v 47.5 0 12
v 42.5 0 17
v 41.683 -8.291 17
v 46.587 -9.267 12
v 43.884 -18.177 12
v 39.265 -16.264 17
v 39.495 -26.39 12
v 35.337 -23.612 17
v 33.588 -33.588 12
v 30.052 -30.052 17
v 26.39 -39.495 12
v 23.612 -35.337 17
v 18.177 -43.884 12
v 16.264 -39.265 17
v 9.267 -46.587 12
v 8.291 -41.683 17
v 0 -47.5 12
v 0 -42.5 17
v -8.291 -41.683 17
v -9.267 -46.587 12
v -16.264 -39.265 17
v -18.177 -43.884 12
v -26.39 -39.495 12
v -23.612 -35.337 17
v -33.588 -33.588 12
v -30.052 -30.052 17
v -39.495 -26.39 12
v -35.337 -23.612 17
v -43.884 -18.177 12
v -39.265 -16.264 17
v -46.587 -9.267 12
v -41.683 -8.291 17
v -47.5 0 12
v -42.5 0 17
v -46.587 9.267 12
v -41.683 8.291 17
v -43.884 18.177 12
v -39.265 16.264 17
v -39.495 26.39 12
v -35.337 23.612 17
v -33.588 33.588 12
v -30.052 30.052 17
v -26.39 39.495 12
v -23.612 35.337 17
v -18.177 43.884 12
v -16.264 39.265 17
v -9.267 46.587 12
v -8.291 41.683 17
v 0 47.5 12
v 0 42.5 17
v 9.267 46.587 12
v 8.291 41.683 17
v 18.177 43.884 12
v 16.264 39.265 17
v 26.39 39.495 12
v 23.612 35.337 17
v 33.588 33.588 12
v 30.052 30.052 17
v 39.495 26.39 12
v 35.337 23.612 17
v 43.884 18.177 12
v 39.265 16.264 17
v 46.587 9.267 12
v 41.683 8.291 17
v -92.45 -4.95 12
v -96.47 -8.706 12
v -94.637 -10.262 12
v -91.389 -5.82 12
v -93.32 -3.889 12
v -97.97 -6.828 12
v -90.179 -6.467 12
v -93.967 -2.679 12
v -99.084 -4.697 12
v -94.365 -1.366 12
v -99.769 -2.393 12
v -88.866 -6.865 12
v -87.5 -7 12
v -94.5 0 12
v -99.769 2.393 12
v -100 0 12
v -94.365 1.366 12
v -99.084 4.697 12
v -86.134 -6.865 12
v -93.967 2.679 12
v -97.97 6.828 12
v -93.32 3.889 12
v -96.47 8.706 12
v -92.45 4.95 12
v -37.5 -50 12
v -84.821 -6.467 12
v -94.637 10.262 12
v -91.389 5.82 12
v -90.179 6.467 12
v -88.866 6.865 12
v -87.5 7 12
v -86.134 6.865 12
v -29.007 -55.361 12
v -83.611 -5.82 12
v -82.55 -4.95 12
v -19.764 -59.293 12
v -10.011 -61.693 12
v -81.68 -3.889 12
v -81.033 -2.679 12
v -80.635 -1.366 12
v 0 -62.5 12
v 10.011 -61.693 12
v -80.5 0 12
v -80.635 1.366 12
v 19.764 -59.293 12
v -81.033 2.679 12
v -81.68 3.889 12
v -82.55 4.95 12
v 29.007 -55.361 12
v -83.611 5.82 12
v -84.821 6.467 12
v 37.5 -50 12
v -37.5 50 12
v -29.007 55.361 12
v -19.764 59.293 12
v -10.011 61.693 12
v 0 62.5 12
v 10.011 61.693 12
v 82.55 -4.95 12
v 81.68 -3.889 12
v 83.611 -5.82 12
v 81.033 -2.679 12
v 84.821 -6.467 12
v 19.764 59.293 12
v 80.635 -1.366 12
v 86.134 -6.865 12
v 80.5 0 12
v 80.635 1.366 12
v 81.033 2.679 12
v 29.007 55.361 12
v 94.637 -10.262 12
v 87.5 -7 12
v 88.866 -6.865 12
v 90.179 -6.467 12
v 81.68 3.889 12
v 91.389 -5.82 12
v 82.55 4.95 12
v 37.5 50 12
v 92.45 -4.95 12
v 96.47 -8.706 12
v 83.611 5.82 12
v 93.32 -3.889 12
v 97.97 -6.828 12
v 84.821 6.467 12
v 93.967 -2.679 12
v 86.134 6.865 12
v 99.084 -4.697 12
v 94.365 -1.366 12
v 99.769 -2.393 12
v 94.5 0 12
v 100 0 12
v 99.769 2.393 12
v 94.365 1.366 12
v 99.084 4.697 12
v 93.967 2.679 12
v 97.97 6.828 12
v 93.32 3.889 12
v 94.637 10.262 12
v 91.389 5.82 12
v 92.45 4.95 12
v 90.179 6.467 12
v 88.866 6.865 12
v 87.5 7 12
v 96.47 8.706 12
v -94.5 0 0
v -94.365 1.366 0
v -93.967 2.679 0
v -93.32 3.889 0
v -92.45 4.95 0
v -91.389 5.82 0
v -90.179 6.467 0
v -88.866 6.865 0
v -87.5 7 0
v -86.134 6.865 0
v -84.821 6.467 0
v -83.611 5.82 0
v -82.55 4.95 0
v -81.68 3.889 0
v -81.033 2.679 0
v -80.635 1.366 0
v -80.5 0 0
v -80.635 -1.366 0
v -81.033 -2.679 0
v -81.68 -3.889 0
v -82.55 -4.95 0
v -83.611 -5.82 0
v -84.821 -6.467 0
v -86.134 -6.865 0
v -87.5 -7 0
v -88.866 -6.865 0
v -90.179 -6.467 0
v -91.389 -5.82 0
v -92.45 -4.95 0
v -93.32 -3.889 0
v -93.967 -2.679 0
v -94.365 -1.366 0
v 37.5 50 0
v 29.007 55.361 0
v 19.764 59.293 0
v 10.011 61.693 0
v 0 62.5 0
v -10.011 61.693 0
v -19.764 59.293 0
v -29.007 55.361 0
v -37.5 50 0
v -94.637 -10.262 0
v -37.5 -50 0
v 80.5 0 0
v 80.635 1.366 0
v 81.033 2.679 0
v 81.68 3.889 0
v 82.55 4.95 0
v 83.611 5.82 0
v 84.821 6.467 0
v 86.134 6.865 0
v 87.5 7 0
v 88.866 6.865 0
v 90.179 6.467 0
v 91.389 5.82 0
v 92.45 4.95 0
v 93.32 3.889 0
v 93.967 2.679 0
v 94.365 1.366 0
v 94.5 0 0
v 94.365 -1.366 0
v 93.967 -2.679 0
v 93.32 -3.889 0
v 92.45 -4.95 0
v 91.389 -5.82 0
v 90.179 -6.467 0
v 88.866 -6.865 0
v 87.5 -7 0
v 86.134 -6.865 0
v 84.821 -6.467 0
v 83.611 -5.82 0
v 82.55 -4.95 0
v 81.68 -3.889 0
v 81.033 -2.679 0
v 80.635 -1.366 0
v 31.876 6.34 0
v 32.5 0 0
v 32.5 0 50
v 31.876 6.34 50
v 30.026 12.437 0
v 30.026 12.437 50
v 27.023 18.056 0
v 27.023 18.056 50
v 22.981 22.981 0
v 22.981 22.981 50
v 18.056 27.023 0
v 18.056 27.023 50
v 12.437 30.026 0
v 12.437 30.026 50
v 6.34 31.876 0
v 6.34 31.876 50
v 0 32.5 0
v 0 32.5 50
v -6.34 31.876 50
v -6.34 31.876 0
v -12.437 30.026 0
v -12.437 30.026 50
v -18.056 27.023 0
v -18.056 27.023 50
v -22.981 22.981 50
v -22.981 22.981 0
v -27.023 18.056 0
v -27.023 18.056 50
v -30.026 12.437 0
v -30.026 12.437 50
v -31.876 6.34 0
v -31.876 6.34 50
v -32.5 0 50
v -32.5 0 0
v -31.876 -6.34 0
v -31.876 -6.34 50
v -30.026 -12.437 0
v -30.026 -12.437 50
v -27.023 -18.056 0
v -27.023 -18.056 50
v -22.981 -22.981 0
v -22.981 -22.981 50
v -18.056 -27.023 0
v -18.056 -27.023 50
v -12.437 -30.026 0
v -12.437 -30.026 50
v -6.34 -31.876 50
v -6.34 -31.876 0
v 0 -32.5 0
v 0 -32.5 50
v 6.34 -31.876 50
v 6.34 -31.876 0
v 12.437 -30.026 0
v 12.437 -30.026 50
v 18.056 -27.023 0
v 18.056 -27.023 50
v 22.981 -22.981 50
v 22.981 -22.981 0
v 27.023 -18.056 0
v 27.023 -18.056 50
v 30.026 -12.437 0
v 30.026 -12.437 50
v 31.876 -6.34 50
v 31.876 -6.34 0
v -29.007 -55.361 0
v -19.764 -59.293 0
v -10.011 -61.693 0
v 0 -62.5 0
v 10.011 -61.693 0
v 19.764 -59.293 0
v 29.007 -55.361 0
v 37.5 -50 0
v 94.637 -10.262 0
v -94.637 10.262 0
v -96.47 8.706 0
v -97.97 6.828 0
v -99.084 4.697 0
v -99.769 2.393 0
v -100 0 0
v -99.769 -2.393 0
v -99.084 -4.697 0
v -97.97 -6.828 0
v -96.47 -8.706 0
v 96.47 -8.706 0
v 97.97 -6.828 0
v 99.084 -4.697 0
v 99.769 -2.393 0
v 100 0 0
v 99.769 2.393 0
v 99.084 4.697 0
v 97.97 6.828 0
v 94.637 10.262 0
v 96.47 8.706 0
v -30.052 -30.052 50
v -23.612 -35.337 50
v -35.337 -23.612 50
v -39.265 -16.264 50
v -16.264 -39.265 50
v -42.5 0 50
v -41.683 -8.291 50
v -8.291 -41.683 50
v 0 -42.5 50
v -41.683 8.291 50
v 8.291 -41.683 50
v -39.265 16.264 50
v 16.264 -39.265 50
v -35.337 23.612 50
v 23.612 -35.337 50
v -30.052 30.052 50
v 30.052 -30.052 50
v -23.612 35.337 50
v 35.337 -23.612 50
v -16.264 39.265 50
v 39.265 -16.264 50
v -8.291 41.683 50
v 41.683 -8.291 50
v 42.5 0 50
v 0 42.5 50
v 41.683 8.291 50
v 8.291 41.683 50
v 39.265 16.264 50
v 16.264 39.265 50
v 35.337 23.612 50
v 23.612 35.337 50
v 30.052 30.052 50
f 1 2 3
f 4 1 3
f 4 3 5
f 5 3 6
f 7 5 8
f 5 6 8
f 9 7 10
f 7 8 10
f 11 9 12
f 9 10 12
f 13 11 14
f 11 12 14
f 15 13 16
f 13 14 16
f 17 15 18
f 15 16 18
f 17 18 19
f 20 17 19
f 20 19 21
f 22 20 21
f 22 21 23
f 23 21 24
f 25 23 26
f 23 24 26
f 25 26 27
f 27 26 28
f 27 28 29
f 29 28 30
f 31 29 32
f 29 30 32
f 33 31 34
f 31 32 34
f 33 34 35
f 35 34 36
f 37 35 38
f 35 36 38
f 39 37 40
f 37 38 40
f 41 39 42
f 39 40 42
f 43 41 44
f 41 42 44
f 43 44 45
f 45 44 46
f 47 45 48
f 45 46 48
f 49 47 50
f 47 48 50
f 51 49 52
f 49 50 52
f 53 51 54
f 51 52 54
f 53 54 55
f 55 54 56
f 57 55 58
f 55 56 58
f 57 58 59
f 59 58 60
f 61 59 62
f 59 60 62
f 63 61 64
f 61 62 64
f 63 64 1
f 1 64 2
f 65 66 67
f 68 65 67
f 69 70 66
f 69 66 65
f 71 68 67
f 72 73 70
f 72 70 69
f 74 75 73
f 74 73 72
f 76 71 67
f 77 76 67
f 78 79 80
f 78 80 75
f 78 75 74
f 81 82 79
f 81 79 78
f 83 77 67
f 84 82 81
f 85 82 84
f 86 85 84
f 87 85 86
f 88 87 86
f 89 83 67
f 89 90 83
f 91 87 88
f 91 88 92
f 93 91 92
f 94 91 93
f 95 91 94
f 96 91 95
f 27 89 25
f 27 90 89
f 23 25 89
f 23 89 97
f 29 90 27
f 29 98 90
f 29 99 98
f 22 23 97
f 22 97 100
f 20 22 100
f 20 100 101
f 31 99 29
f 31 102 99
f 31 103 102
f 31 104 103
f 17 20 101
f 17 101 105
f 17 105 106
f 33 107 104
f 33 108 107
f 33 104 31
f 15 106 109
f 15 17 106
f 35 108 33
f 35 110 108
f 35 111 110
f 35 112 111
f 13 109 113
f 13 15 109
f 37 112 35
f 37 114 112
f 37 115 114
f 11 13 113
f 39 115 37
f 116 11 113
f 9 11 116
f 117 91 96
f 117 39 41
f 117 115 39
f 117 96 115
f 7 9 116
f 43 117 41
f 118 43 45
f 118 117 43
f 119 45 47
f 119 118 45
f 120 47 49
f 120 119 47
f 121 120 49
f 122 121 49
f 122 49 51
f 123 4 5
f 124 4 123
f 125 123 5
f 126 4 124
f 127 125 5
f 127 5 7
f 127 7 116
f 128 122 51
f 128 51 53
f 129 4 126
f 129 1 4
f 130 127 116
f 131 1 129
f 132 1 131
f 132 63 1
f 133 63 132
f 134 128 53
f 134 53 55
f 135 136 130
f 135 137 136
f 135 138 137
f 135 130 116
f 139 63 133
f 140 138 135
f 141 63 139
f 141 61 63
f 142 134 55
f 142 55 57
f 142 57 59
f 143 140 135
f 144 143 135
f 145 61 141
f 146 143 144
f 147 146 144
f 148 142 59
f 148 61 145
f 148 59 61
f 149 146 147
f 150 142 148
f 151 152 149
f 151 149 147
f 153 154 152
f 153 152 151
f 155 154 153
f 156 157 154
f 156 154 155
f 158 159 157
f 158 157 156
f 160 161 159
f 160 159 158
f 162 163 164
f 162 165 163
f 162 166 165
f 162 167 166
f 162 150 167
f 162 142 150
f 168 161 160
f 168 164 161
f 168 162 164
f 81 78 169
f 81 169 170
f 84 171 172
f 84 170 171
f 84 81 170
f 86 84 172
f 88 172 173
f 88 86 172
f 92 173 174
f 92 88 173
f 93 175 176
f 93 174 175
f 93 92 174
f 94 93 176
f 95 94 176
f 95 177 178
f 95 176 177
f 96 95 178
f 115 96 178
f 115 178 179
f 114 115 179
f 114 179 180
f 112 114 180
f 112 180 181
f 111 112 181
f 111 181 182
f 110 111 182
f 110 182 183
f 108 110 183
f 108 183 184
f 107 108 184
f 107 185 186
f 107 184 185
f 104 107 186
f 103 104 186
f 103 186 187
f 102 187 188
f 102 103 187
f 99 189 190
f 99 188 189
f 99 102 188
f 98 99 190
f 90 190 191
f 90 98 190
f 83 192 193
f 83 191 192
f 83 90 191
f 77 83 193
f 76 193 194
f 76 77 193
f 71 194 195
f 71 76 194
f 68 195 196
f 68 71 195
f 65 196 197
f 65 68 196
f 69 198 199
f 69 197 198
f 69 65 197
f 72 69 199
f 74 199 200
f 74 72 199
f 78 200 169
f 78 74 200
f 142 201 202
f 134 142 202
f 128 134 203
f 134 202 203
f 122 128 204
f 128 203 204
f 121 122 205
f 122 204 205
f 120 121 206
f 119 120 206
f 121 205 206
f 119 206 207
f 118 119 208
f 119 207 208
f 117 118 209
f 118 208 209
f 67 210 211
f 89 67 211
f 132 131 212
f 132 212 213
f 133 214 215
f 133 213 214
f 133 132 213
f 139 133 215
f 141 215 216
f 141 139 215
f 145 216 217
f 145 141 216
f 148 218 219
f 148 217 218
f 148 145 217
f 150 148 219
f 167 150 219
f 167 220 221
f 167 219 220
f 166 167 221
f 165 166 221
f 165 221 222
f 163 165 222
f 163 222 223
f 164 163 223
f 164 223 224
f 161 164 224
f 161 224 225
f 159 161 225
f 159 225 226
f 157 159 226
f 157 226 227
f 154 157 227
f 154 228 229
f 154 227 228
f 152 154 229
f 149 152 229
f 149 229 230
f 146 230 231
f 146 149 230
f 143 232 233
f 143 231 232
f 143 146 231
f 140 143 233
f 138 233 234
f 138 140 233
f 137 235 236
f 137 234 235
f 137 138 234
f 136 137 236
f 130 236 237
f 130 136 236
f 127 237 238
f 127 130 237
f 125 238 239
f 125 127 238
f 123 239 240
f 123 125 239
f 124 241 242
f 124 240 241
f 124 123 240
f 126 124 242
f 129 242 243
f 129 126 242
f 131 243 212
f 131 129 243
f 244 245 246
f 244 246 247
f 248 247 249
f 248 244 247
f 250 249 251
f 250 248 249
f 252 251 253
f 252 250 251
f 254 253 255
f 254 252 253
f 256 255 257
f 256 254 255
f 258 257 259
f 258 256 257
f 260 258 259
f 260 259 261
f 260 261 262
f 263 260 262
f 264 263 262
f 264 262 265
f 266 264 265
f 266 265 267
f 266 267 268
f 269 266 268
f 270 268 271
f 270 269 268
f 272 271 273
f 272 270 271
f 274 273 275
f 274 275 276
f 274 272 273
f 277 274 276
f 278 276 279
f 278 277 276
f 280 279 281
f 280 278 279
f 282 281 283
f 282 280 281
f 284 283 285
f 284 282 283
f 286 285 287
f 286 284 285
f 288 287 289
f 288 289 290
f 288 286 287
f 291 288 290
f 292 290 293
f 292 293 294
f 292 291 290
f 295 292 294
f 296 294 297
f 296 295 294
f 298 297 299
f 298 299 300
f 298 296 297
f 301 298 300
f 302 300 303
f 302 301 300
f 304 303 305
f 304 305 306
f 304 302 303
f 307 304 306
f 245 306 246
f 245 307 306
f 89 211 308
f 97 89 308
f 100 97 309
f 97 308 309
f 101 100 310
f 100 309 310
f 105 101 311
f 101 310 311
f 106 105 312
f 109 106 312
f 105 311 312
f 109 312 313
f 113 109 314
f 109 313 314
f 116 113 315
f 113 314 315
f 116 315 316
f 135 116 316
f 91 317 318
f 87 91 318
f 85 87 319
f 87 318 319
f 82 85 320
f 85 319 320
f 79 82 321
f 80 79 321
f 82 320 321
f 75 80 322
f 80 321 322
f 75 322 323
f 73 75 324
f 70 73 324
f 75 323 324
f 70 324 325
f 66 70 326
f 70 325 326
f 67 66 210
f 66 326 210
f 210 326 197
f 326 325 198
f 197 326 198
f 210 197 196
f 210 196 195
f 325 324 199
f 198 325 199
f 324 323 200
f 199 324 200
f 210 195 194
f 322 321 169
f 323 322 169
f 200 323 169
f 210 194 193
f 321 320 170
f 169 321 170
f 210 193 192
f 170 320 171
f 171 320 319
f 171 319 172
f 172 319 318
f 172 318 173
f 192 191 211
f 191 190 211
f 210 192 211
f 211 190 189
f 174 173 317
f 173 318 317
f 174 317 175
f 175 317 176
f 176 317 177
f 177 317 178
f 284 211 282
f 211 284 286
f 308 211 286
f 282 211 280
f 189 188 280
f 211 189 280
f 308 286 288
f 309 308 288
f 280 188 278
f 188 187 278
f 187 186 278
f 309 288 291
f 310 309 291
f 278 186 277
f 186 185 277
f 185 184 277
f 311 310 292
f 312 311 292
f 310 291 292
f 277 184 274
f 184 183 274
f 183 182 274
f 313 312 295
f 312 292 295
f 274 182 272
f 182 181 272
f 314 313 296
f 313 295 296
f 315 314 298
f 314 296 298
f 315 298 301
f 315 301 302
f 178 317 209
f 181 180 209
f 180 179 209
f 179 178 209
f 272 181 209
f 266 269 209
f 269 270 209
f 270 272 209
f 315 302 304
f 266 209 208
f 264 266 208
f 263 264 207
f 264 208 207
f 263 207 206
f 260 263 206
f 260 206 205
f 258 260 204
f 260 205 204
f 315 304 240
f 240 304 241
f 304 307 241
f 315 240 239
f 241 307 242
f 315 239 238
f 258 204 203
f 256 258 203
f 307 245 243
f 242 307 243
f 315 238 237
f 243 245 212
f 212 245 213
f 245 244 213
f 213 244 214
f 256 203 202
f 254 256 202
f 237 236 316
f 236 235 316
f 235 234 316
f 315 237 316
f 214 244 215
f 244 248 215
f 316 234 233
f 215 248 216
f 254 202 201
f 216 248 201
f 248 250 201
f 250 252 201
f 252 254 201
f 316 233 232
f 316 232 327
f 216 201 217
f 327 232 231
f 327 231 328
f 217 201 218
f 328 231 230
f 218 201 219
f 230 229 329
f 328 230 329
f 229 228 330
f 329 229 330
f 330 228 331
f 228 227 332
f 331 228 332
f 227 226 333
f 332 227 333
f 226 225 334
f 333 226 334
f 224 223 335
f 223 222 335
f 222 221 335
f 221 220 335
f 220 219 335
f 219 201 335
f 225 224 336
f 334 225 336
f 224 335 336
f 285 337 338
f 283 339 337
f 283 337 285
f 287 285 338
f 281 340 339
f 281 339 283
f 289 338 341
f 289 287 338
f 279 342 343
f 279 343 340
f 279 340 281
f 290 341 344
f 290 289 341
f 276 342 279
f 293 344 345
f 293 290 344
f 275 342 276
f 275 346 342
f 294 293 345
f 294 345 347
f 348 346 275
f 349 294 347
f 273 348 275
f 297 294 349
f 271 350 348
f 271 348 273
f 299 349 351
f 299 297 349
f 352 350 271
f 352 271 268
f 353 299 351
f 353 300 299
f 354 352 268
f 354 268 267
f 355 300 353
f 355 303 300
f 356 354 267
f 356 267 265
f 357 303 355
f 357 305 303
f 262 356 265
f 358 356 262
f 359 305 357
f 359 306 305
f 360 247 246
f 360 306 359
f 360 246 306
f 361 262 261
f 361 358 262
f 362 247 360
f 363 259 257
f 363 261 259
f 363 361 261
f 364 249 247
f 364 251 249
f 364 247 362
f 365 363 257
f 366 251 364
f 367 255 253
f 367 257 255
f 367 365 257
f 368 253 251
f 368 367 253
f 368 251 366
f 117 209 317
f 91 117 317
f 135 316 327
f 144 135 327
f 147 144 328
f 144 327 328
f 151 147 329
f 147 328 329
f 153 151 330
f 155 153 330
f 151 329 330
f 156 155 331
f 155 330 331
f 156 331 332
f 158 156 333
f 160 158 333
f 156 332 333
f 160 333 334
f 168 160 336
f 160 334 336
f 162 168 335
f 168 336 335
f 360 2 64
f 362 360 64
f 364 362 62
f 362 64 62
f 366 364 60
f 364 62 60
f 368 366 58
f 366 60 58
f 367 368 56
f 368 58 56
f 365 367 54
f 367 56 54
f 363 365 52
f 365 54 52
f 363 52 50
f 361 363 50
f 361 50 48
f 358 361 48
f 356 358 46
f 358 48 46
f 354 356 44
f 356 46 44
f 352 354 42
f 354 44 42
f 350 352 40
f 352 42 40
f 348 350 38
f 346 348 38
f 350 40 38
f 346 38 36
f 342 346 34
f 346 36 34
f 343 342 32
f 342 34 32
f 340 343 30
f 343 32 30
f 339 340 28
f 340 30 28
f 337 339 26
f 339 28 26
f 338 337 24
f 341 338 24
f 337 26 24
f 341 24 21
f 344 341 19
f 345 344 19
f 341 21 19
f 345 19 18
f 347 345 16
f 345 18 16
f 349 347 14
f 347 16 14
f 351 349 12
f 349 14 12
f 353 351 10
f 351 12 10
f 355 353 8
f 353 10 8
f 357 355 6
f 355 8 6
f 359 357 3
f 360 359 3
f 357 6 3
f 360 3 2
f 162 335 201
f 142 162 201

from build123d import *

# Parameters (mm, degrees)
SKETCH1_R               = 42.5
SKETCH1_R_2             = 32.5
BOSS_EXTRUDE1_DEPTH     = 50
SKETCH2_R               = 42.5
BOSS_EXTRUDE2_DEPTH     = 12
CUT_EXTRUDE1_DEPTH      = 129.086884575
CUT_EXTRUDE1_DEPTH_BACK = 129.086884575
SKETCH3_R               = 7
CHAMFER1_SIZE           = 5


with BuildPart() as part:
    # Sketch1 → Boss-Extrude1 (new body)
    with BuildSketch(Plane.XY):
        Circle(SKETCH1_R)
        Circle(SKETCH1_R_2, mode=Mode.SUBTRACT)
    extrude(amount=BOSS_EXTRUDE1_DEPTH)

    # Sketch2 → Boss-Extrude2 (add)
    with BuildSketch(Plane(origin=(0, 0, 0), x_dir=(-1, 0, 0), z_dir=(0, 0, -1))):
        with BuildLine():
            Line((-37.500000001, -49.999999999), (-94.637131817, -10.262131817))
            ThreePointArc((-94.637131817, -10.262131817), (-100, 0), (-94.637131817, 10.262131817))
            Line((-94.637131817, 10.262131817), (-37.500000001, 49.999999999))
            ThreePointArc((-37.500000001, 49.999999999), (0, 62.5), (37.500000001, 49.999999999))
            Line((37.500000001, 49.999999999), (94.637131817, 10.262131817))
            ThreePointArc((94.637131817, 10.262131817), (100, 0), (94.637131817, -10.262131817))
            Line((94.637131817, -10.262131817), (37.500000001, -49.999999999))
            ThreePointArc((37.500000001, -49.999999999), (0, -62.5), (-37.500000001, -49.999999999))
        make_face()
        Circle(SKETCH2_R, mode=Mode.SUBTRACT)
    extrude(amount=-BOSS_EXTRUDE2_DEPTH)

    # Sketch3 → Cut-Extrude1 (cut, two sides: drawn at the far end of the back side and taken through both)
    with BuildSketch(Plane(origin=(0, 0, 0), x_dir=(-1, 0, 0), z_dir=(0, 0, -1)).offset(-CUT_EXTRUDE1_DEPTH_BACK)):
        with Locations((87.5, 0)):
            Circle(SKETCH3_R)
        with Locations((-87.5, 0)):
            Circle(SKETCH3_R)
    extrude(amount=CUT_EXTRUDE1_DEPTH + CUT_EXTRUDE1_DEPTH_BACK, mode=Mode.SUBTRACT)

    # Chamfer1
    chamfer1_edges = [part.edges().sort_by_distance(p)[0] for p in [
        (-42.5, 0, 12),
    ]]
    chamfer(chamfer1_edges, length=CHAMFER1_SIZE)


solid = part.part
